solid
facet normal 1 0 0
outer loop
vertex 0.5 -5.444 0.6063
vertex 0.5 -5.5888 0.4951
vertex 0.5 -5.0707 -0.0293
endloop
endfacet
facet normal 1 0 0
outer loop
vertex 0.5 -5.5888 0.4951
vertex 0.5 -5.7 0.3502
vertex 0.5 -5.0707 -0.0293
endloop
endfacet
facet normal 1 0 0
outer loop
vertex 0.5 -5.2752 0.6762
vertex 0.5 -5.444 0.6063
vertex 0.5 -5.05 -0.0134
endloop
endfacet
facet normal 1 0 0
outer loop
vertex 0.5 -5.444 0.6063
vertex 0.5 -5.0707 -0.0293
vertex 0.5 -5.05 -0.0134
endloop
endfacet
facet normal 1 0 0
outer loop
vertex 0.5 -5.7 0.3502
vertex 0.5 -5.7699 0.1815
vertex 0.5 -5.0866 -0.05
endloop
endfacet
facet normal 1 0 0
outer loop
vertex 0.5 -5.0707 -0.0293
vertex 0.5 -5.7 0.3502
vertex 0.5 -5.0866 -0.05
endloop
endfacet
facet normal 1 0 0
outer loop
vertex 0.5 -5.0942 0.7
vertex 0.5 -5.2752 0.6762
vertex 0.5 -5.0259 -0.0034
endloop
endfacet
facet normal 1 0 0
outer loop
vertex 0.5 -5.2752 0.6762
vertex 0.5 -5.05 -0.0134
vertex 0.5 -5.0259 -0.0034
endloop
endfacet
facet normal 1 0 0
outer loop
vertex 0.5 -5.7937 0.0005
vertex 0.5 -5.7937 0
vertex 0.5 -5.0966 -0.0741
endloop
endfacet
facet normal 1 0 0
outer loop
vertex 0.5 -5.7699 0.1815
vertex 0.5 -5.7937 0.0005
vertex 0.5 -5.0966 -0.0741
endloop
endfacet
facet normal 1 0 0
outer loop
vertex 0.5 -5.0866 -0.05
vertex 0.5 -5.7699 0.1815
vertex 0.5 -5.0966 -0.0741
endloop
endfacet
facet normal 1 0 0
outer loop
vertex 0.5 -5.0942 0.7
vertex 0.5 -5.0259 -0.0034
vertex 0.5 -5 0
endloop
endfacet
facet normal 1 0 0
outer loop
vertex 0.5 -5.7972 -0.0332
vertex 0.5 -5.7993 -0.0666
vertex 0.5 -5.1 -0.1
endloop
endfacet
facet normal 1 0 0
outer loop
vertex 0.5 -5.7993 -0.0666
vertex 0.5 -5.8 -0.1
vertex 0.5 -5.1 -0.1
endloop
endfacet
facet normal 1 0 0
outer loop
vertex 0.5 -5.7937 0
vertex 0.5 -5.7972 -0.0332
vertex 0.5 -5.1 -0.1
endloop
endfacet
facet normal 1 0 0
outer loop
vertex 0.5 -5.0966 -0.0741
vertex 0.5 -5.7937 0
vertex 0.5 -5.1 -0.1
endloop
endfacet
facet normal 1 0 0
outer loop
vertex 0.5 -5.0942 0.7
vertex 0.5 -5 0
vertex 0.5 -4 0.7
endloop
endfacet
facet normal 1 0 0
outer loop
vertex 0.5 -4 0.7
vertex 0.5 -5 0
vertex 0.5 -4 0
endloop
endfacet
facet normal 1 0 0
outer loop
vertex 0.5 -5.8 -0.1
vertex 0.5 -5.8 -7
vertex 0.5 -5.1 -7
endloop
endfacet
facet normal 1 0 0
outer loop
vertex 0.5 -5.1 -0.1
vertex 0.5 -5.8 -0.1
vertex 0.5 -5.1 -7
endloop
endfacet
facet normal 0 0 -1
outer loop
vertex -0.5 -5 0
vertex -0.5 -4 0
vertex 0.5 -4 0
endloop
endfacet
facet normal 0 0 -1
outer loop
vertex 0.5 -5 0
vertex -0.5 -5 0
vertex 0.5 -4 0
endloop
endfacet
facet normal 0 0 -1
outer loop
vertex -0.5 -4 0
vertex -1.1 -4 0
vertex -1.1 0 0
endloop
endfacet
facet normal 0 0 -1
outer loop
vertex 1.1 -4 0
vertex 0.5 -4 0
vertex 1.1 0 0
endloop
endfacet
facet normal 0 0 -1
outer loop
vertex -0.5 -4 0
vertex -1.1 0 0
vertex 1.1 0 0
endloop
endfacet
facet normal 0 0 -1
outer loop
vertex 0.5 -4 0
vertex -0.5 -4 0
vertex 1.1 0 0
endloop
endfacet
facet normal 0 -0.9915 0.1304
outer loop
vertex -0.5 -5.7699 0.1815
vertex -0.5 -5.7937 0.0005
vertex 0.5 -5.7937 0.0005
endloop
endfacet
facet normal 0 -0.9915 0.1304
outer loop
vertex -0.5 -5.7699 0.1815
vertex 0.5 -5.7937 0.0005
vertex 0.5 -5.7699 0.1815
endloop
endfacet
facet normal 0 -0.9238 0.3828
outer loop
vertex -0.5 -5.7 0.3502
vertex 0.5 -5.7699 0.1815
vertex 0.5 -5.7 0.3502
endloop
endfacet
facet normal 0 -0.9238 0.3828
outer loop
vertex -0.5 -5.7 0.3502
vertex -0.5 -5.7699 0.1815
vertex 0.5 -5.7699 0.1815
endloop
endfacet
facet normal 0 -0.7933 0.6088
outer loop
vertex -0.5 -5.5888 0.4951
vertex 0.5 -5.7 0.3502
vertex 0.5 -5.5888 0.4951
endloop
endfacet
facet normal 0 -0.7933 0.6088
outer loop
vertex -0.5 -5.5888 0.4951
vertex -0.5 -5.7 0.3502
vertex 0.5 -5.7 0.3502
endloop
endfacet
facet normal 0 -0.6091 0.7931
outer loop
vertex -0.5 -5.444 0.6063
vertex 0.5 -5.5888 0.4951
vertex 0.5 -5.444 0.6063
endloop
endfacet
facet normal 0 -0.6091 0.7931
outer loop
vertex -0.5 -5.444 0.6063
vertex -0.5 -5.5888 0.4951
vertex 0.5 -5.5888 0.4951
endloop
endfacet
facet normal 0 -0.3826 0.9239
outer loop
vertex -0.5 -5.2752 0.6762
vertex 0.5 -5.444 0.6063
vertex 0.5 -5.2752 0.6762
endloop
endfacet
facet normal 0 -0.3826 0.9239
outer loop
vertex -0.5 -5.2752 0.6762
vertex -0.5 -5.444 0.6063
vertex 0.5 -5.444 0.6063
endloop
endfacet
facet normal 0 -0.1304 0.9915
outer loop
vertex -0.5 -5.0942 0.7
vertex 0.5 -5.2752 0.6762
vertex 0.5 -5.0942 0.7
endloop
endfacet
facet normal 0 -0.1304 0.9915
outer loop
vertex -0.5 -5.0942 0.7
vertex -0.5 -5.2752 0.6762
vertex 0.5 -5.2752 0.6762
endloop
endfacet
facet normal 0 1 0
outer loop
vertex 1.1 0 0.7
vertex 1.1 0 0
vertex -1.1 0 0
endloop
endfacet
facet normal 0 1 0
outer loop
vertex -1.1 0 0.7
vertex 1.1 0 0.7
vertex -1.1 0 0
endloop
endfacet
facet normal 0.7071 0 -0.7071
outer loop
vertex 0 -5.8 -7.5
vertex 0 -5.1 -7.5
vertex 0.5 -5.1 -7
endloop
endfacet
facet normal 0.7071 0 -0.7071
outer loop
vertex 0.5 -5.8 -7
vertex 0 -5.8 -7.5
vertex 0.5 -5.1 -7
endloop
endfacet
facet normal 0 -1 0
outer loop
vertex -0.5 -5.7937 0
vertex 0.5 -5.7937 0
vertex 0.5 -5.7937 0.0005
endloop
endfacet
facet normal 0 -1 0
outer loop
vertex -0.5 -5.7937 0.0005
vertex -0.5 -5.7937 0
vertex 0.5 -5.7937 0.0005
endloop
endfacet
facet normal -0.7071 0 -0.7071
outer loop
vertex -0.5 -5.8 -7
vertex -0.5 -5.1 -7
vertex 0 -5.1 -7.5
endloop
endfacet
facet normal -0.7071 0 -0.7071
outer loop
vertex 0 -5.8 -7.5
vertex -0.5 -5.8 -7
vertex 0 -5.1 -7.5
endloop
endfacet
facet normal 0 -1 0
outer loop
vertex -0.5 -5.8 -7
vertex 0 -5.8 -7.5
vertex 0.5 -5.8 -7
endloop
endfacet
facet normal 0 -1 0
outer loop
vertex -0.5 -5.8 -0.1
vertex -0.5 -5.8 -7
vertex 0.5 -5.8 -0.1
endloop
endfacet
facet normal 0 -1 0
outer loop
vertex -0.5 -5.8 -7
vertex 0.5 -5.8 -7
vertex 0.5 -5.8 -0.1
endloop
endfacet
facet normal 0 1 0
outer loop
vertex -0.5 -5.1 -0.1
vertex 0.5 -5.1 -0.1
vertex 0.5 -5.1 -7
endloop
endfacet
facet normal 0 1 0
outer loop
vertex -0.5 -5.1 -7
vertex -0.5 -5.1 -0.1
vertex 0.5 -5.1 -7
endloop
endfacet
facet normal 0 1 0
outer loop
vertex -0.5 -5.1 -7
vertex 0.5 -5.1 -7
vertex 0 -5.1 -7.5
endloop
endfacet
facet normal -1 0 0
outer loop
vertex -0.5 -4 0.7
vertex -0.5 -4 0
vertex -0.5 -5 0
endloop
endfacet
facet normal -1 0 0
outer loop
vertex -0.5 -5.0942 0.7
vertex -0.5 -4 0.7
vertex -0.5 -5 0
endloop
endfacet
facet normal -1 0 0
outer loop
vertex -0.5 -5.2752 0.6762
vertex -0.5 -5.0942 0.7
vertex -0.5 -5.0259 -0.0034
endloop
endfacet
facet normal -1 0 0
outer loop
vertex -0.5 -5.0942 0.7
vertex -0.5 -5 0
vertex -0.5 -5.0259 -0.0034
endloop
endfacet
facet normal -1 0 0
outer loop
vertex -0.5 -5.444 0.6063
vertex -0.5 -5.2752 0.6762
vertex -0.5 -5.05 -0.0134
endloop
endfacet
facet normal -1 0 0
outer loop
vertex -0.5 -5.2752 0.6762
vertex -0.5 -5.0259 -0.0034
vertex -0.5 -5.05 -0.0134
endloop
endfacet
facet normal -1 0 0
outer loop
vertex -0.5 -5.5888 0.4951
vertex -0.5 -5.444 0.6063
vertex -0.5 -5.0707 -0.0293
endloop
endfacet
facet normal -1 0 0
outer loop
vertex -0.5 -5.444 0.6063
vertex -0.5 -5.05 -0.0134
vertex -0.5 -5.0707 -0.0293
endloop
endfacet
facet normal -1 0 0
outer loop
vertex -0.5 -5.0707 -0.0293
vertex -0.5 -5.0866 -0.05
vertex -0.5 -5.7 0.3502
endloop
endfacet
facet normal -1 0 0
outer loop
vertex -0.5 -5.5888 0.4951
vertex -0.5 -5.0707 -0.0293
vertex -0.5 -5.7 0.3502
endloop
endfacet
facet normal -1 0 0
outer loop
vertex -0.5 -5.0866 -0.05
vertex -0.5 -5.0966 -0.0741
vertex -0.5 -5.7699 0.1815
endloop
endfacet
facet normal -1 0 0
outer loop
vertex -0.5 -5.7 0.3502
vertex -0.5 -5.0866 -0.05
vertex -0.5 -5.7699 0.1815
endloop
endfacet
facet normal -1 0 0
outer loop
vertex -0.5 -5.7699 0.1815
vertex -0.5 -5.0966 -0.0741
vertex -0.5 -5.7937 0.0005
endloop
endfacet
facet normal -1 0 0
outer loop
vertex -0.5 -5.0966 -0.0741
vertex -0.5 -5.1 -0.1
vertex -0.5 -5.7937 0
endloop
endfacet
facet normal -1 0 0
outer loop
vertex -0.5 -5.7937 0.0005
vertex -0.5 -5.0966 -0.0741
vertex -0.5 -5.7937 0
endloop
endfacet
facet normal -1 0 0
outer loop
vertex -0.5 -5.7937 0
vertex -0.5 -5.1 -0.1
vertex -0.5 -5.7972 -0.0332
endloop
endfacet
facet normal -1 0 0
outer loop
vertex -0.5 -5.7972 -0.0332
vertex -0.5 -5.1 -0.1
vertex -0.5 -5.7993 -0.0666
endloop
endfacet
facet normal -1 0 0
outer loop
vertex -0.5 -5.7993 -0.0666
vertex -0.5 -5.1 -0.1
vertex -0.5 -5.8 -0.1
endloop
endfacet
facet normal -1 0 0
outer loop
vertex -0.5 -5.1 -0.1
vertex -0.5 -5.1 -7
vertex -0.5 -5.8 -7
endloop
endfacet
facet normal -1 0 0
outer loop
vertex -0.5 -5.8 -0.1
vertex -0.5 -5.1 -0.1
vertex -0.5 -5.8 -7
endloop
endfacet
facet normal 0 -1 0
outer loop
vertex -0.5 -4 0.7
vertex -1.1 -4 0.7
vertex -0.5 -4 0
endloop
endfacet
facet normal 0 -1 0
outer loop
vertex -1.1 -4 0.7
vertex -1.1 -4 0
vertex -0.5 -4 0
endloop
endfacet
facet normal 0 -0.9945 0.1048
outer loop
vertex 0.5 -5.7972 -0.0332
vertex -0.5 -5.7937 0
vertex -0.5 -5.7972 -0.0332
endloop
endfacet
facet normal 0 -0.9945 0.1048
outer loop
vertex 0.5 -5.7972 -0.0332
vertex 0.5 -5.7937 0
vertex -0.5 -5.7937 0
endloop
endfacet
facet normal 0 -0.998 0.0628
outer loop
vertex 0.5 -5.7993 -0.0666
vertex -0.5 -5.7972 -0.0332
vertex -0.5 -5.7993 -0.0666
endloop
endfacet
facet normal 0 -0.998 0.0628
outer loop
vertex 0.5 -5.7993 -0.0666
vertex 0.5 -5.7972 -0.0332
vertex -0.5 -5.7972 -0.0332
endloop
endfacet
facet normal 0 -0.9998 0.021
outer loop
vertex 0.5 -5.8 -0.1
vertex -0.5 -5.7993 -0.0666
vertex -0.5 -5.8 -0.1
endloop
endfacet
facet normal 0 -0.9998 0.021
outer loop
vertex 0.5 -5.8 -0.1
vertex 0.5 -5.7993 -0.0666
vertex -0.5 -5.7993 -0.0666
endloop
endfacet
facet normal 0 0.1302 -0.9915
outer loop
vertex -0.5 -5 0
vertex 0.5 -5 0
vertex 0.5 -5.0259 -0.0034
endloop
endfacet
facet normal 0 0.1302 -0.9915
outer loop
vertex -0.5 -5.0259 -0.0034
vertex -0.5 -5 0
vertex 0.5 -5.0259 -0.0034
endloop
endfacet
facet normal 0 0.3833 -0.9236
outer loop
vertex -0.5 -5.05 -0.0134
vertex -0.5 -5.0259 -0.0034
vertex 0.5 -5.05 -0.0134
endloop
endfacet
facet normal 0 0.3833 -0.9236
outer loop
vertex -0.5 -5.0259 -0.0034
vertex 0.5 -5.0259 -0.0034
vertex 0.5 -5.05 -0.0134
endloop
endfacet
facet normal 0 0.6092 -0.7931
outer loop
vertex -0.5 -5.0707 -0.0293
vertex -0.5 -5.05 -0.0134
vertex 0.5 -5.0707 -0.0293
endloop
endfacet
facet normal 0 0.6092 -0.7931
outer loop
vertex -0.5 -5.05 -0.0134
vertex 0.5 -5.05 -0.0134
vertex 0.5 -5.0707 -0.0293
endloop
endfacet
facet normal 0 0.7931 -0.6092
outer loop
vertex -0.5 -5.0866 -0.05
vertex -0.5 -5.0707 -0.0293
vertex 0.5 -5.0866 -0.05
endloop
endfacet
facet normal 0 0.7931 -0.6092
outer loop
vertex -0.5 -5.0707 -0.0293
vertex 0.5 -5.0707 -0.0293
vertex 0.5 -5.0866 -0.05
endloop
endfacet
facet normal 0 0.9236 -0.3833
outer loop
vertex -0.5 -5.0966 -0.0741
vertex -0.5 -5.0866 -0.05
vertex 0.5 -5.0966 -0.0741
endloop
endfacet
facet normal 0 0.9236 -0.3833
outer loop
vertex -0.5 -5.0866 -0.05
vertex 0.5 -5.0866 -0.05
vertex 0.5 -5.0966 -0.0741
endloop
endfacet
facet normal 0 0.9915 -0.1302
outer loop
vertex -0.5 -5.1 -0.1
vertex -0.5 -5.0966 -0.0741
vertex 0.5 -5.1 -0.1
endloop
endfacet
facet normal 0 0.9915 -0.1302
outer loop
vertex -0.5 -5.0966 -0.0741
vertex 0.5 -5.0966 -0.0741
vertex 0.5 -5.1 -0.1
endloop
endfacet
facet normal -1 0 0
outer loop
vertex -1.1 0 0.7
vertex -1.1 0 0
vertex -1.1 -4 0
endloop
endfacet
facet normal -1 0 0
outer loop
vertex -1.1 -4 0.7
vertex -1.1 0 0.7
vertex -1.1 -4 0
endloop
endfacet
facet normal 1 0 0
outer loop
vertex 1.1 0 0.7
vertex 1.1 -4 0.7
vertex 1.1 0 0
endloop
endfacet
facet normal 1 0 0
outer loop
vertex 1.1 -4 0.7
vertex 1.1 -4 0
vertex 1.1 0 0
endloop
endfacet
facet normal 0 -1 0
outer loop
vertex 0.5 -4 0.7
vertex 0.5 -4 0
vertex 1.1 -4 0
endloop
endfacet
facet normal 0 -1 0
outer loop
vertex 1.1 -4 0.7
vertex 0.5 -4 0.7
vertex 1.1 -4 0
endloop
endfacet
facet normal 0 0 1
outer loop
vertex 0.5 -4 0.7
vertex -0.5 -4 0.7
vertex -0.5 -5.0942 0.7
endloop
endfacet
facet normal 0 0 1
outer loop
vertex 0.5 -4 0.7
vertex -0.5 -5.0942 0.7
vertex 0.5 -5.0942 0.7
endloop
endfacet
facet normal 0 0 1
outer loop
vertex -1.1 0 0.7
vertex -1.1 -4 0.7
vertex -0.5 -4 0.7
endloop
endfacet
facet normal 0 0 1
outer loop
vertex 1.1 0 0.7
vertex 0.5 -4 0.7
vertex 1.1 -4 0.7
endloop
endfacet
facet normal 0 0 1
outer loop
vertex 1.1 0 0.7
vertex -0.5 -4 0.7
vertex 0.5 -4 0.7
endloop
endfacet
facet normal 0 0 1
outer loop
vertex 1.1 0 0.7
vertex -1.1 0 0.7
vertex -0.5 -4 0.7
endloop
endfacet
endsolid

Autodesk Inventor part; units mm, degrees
ref_plane "YZ Plane" through (0, 0, 0) normal (1, 0, 0) x (0, 1, 0)
ref_plane "XZ Plane" through (0, 0, 0) normal (0, 1, 0) x (-1, 0, 0)
ref_plane "XY Plane" through (0, 0, 0) normal (0, 0, 1) x (1, 0, 0)
sketch "Sketch1" plane through (0, 0, 0) normal (0, 0, 1) x (1, 0, 0)
  line L0 (1.1, 0) -> (-1.1, 0)
  line L1 (-1.1, 0) -> (-1.1, -4)
  line L2 (-1.1, -4) -> (-0.5, -4)
  line L3 (-0.5, -4) -> (-0.5, -17)
  line L4 (-0.5, -17) -> (0, -17.5)
  line L5 (0, -17.5) -> (0.5, -17)
  line L6 (0.5, -17) -> (0.5, -4)
  line L7 (0.5, -4) -> (1.1, -4)
  line L8 (1.1, -4) -> (1.1, 0)
  line L9 (0, 0) -> (0, -17.5) construction
  dimension "d0" = 2.2
  dimension "d1" = 17.5
  dimension "d3" = 1
  dimension "d4" = 4
  dimension "d5" = -45
extrude "Extrusion1" add sketch "Sketch1" along normal blind 0.7
sketch "Sketch2" plane through (0, 0, 0.7) normal (0, 0, 1) x (1, 0, 0)
  line L0 (1.1, 0) -> (-1.1, 0) projected
  line L1 (-0.5, -4) -> (-0.5, -17) projected
  line L2 (0.5, -17) -> (0.5, -4) projected
  point P0 (0, 0)
  point P1 (-0.5, -5)
  point P2 (0.5, -5)
extrude "Extrusion2" [suppressed]
sketch "Sketch3" plane through (0.5, -4, 0.7) normal (1, 0, 0) x (0, 0, -1)
  line L0 (0.7, 0) -> (0.7, -13) projected
  line L1 (0.8, -1.1) -> (8.2, -1.1)
  line L2 (8.2, -1.1) -> (8.2, -1.8)
  line L3 (8.2, -1.8) -> (0.8, -1.8)
  arc A0 (0.7, -1) -> (0.8, -1.1) centre (0.8, -1) ccw
  line L4 (0.7, -13) -> (0.7, 0) projected
  arc A1 (0, -1) -> (0.8, -1.8) centre (0.8, -1) ccw
  line L5 (0, -13) -> (0, 0) projected
  line L6 (0, -1) -> (0.7, -1) projected
  line L7 (0, -1) -> (0.7, -1)
  point P0 (0.7, 4)
  dimension "d12" = 0.7
  dimension "d19" = 0.1
  dimension "d20" = 0.7
  dimension "d21" = 7.5
extrude "Extrusion5" add sketch "Sketch3" against normal blind 1
sketch "Sketch5" plane through (0.5, -5.1, -0.1) normal (0, 1, 0) x (1, 0, 0)
  line L0 (-1, 0) -> (-1, 7.4) projected
  line L1 (-1, 6.9) -> (-0.5, 7.4)
  line L2 (-0.5, 7.4) -> (-1, 7.4)
  line L3 (-1, 7.4) -> (-1, 6.9)
  line L4 (-0.5, 7.4) -> (0, 6.9)
  line L5 (0, 7.4) -> (-1, 7.4) projected
  line L6 (0, 6.9) -> (0, 7.4)
  line L7 (0, 7.4) -> (-0.5, 7.4)
  line L8 (0, 0) -> (-1, 0) construction
  line L9 (-0.5, 0) -> (-0.5, 7.4) construction
  point P0 (-0.5, -0.1)
  dimension "d25" = 90
extrude "Extrusion6" cut sketch "Sketch5" against normal blind 1
sketch "Sketch6" plane through (0.5, -17, 0.7) normal (1, 0, 0) x (0, 0, -1)
  line L0 (0.7, 0) -> (0.7, 11.2063) projected
  line L1 (0, -0.5) -> (0, 0) projected
  line L2 (0.7, 11.2063) -> (0, 11.2063)
  line L3 (0, 11.2063) -> (0, -0.5)
  line L4 (0, -0.5) -> (0.7, -0.5)
  line L5 (0.7, -0.5) -> (0.7, 11.2063)
  point P0 (0.7, 17)
extrude "Extrusion7" cut sketch "Sketch6" against normal blind 10
fillet "Fillet2" radius 0.7 1 edges at (0, -5.7937, 0.7)
properties part number "BrueckenGR_LVE2560E_Feet" material "Nickel-Copper Alloy 400"
